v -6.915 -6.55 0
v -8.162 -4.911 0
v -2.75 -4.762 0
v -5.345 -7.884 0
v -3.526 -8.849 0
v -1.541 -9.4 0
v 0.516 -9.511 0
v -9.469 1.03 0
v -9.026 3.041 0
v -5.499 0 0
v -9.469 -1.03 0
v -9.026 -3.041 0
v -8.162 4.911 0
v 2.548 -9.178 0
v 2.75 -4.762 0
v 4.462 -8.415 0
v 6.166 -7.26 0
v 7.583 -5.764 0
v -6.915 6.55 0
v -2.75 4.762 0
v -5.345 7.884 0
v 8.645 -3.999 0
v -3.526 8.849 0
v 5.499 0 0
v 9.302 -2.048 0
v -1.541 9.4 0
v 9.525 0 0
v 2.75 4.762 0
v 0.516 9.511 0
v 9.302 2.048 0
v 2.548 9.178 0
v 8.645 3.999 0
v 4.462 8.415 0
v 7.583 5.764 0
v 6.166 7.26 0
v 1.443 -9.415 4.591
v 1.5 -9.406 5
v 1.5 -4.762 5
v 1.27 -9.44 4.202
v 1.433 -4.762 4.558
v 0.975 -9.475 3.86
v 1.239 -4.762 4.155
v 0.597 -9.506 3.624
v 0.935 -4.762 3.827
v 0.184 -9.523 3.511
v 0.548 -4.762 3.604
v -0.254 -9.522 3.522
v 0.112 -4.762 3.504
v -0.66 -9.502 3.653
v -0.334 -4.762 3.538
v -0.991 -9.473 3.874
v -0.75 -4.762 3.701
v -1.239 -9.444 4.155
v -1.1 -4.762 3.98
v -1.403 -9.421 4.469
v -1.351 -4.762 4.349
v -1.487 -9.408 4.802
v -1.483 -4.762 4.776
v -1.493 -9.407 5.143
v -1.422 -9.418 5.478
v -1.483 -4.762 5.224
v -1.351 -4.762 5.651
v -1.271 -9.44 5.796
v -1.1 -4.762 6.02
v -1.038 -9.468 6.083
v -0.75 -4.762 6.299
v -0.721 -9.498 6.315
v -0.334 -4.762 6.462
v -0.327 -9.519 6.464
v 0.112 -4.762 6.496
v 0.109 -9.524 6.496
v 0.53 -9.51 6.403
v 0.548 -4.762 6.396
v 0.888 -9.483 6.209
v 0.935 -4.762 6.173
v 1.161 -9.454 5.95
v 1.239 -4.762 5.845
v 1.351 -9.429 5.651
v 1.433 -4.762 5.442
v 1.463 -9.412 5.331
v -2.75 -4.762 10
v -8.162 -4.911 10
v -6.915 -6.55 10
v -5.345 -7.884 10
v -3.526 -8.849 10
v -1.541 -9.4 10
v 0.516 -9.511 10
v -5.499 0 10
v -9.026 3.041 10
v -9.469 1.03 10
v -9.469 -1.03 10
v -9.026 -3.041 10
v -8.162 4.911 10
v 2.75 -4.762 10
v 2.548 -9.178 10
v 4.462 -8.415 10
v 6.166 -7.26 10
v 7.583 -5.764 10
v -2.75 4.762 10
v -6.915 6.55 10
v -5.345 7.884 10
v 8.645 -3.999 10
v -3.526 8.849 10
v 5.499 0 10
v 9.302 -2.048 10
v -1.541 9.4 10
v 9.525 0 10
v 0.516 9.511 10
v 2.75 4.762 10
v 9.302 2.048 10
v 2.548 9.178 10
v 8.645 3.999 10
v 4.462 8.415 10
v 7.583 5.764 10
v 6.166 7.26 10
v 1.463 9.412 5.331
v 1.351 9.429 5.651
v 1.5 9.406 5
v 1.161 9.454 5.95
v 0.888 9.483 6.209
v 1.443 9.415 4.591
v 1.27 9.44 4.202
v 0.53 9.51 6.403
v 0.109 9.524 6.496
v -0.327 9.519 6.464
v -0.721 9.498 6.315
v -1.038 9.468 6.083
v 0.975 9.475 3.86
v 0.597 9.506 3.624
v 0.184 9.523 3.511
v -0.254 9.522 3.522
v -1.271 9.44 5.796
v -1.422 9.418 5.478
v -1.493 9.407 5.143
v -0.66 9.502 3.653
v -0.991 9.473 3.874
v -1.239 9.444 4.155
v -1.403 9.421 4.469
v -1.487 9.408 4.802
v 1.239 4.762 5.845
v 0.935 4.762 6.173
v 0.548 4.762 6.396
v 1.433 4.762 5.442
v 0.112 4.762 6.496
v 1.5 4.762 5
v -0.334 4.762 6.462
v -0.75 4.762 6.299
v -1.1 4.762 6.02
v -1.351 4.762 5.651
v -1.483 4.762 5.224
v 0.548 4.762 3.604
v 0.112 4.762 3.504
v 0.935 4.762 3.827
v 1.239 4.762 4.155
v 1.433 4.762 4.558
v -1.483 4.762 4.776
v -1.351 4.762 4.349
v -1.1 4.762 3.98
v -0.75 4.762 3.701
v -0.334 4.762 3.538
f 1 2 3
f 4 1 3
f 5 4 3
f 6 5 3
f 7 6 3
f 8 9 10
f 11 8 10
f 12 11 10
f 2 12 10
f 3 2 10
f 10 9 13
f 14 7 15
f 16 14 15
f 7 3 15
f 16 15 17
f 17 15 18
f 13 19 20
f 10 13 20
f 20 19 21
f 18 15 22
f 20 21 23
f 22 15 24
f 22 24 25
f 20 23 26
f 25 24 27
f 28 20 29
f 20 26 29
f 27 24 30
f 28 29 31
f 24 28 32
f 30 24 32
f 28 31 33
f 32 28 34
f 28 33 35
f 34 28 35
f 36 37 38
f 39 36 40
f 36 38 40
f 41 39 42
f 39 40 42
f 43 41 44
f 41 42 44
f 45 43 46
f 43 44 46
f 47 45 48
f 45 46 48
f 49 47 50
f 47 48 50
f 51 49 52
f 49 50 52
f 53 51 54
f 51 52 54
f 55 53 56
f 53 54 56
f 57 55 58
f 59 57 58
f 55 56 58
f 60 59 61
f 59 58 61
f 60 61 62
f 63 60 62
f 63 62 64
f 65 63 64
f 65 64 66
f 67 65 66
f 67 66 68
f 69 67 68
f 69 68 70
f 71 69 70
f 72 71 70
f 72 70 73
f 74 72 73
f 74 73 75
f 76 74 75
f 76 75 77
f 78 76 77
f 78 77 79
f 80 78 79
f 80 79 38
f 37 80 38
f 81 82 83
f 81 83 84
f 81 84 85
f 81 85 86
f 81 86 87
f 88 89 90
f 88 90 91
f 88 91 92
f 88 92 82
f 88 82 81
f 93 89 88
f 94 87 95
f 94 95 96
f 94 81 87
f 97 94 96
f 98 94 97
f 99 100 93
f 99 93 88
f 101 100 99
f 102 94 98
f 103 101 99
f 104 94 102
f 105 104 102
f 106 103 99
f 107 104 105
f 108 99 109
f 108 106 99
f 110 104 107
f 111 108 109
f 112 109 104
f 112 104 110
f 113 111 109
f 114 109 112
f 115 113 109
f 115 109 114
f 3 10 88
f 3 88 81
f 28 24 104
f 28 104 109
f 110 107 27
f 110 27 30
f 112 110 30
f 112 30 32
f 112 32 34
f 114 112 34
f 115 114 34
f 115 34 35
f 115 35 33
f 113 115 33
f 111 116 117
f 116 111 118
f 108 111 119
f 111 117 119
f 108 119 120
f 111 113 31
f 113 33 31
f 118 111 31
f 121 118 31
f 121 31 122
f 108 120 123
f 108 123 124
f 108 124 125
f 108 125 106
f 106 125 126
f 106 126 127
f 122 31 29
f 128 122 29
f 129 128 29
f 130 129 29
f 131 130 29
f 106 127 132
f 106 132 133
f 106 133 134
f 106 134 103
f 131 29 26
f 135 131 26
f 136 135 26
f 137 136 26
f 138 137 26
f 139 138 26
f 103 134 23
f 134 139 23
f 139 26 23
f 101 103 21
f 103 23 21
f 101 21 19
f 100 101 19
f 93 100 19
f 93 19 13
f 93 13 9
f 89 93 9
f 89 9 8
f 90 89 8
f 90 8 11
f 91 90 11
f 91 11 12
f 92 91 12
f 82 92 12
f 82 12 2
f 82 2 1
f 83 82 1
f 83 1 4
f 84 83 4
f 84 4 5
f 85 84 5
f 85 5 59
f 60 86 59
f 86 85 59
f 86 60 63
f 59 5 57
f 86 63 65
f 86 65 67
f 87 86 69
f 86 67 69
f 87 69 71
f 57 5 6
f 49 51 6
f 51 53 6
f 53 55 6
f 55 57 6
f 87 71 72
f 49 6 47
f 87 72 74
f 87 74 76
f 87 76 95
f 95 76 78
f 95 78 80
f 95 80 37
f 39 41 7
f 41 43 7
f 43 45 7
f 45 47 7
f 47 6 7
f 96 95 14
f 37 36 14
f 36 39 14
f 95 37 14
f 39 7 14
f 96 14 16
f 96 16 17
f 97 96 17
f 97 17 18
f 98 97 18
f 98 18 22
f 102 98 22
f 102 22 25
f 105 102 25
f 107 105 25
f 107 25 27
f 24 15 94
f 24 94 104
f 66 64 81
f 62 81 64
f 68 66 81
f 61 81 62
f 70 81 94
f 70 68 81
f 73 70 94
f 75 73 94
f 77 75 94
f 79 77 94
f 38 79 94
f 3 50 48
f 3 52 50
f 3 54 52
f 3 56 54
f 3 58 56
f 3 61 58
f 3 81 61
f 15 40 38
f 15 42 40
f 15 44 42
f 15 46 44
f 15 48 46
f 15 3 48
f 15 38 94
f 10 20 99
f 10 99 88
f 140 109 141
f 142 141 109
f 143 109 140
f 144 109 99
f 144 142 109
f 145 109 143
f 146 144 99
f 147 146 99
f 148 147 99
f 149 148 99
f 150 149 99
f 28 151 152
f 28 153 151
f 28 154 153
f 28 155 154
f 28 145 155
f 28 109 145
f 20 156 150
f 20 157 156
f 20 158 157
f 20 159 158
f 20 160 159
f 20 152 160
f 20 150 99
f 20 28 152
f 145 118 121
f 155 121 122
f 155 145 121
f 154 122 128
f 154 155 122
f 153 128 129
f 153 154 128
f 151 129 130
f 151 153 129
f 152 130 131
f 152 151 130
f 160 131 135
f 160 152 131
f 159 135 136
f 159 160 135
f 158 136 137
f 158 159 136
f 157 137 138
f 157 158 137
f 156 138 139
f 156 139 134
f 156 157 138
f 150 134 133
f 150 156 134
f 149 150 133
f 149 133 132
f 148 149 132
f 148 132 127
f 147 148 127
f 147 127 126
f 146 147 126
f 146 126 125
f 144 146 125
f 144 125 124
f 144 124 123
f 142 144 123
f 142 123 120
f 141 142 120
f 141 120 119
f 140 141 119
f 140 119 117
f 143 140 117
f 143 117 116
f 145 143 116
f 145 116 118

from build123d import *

# Parameters (mm, degrees)
SKETCH2_R               = 9.525
BOSS_EXTRUDE1_DEPTH     = 10
SKETCH3_R               = 1.5
CUT_EXTRUDE1_DEPTH      = 15.2875
CUT_EXTRUDE1_DEPTH_BACK = 5.7625


with BuildPart() as part:
    # Sketch2 → Boss-Extrude1 (new body)
    with BuildSketch(Plane.XY):
        Circle(SKETCH2_R)
        Polygon((5.499261314, 0), (2.749630657, 4.7625), (-2.749630657, 4.7625), (-5.499261314, 0), (-2.749630657, -4.7625), (2.749630657, -4.7625), align=None, mode=Mode.SUBTRACT)
    extrude(amount=BOSS_EXTRUDE1_DEPTH)

    # Sketch3 → Cut-Extrude1 (cut, two sides)
    with BuildSketch(Plane(origin=(0, -4.7625, 0), x_dir=(1, 0, 0), z_dir=(0, 1, 0))) as cut_extrude1_sk:
        with Locations((0, -5)):
            Circle(SKETCH3_R)
    extrude(amount=CUT_EXTRUDE1_DEPTH, mode=Mode.SUBTRACT)
    extrude(cut_extrude1_sk.sketch, amount=-CUT_EXTRUDE1_DEPTH_BACK, mode=Mode.SUBTRACT)


solid = part.part
